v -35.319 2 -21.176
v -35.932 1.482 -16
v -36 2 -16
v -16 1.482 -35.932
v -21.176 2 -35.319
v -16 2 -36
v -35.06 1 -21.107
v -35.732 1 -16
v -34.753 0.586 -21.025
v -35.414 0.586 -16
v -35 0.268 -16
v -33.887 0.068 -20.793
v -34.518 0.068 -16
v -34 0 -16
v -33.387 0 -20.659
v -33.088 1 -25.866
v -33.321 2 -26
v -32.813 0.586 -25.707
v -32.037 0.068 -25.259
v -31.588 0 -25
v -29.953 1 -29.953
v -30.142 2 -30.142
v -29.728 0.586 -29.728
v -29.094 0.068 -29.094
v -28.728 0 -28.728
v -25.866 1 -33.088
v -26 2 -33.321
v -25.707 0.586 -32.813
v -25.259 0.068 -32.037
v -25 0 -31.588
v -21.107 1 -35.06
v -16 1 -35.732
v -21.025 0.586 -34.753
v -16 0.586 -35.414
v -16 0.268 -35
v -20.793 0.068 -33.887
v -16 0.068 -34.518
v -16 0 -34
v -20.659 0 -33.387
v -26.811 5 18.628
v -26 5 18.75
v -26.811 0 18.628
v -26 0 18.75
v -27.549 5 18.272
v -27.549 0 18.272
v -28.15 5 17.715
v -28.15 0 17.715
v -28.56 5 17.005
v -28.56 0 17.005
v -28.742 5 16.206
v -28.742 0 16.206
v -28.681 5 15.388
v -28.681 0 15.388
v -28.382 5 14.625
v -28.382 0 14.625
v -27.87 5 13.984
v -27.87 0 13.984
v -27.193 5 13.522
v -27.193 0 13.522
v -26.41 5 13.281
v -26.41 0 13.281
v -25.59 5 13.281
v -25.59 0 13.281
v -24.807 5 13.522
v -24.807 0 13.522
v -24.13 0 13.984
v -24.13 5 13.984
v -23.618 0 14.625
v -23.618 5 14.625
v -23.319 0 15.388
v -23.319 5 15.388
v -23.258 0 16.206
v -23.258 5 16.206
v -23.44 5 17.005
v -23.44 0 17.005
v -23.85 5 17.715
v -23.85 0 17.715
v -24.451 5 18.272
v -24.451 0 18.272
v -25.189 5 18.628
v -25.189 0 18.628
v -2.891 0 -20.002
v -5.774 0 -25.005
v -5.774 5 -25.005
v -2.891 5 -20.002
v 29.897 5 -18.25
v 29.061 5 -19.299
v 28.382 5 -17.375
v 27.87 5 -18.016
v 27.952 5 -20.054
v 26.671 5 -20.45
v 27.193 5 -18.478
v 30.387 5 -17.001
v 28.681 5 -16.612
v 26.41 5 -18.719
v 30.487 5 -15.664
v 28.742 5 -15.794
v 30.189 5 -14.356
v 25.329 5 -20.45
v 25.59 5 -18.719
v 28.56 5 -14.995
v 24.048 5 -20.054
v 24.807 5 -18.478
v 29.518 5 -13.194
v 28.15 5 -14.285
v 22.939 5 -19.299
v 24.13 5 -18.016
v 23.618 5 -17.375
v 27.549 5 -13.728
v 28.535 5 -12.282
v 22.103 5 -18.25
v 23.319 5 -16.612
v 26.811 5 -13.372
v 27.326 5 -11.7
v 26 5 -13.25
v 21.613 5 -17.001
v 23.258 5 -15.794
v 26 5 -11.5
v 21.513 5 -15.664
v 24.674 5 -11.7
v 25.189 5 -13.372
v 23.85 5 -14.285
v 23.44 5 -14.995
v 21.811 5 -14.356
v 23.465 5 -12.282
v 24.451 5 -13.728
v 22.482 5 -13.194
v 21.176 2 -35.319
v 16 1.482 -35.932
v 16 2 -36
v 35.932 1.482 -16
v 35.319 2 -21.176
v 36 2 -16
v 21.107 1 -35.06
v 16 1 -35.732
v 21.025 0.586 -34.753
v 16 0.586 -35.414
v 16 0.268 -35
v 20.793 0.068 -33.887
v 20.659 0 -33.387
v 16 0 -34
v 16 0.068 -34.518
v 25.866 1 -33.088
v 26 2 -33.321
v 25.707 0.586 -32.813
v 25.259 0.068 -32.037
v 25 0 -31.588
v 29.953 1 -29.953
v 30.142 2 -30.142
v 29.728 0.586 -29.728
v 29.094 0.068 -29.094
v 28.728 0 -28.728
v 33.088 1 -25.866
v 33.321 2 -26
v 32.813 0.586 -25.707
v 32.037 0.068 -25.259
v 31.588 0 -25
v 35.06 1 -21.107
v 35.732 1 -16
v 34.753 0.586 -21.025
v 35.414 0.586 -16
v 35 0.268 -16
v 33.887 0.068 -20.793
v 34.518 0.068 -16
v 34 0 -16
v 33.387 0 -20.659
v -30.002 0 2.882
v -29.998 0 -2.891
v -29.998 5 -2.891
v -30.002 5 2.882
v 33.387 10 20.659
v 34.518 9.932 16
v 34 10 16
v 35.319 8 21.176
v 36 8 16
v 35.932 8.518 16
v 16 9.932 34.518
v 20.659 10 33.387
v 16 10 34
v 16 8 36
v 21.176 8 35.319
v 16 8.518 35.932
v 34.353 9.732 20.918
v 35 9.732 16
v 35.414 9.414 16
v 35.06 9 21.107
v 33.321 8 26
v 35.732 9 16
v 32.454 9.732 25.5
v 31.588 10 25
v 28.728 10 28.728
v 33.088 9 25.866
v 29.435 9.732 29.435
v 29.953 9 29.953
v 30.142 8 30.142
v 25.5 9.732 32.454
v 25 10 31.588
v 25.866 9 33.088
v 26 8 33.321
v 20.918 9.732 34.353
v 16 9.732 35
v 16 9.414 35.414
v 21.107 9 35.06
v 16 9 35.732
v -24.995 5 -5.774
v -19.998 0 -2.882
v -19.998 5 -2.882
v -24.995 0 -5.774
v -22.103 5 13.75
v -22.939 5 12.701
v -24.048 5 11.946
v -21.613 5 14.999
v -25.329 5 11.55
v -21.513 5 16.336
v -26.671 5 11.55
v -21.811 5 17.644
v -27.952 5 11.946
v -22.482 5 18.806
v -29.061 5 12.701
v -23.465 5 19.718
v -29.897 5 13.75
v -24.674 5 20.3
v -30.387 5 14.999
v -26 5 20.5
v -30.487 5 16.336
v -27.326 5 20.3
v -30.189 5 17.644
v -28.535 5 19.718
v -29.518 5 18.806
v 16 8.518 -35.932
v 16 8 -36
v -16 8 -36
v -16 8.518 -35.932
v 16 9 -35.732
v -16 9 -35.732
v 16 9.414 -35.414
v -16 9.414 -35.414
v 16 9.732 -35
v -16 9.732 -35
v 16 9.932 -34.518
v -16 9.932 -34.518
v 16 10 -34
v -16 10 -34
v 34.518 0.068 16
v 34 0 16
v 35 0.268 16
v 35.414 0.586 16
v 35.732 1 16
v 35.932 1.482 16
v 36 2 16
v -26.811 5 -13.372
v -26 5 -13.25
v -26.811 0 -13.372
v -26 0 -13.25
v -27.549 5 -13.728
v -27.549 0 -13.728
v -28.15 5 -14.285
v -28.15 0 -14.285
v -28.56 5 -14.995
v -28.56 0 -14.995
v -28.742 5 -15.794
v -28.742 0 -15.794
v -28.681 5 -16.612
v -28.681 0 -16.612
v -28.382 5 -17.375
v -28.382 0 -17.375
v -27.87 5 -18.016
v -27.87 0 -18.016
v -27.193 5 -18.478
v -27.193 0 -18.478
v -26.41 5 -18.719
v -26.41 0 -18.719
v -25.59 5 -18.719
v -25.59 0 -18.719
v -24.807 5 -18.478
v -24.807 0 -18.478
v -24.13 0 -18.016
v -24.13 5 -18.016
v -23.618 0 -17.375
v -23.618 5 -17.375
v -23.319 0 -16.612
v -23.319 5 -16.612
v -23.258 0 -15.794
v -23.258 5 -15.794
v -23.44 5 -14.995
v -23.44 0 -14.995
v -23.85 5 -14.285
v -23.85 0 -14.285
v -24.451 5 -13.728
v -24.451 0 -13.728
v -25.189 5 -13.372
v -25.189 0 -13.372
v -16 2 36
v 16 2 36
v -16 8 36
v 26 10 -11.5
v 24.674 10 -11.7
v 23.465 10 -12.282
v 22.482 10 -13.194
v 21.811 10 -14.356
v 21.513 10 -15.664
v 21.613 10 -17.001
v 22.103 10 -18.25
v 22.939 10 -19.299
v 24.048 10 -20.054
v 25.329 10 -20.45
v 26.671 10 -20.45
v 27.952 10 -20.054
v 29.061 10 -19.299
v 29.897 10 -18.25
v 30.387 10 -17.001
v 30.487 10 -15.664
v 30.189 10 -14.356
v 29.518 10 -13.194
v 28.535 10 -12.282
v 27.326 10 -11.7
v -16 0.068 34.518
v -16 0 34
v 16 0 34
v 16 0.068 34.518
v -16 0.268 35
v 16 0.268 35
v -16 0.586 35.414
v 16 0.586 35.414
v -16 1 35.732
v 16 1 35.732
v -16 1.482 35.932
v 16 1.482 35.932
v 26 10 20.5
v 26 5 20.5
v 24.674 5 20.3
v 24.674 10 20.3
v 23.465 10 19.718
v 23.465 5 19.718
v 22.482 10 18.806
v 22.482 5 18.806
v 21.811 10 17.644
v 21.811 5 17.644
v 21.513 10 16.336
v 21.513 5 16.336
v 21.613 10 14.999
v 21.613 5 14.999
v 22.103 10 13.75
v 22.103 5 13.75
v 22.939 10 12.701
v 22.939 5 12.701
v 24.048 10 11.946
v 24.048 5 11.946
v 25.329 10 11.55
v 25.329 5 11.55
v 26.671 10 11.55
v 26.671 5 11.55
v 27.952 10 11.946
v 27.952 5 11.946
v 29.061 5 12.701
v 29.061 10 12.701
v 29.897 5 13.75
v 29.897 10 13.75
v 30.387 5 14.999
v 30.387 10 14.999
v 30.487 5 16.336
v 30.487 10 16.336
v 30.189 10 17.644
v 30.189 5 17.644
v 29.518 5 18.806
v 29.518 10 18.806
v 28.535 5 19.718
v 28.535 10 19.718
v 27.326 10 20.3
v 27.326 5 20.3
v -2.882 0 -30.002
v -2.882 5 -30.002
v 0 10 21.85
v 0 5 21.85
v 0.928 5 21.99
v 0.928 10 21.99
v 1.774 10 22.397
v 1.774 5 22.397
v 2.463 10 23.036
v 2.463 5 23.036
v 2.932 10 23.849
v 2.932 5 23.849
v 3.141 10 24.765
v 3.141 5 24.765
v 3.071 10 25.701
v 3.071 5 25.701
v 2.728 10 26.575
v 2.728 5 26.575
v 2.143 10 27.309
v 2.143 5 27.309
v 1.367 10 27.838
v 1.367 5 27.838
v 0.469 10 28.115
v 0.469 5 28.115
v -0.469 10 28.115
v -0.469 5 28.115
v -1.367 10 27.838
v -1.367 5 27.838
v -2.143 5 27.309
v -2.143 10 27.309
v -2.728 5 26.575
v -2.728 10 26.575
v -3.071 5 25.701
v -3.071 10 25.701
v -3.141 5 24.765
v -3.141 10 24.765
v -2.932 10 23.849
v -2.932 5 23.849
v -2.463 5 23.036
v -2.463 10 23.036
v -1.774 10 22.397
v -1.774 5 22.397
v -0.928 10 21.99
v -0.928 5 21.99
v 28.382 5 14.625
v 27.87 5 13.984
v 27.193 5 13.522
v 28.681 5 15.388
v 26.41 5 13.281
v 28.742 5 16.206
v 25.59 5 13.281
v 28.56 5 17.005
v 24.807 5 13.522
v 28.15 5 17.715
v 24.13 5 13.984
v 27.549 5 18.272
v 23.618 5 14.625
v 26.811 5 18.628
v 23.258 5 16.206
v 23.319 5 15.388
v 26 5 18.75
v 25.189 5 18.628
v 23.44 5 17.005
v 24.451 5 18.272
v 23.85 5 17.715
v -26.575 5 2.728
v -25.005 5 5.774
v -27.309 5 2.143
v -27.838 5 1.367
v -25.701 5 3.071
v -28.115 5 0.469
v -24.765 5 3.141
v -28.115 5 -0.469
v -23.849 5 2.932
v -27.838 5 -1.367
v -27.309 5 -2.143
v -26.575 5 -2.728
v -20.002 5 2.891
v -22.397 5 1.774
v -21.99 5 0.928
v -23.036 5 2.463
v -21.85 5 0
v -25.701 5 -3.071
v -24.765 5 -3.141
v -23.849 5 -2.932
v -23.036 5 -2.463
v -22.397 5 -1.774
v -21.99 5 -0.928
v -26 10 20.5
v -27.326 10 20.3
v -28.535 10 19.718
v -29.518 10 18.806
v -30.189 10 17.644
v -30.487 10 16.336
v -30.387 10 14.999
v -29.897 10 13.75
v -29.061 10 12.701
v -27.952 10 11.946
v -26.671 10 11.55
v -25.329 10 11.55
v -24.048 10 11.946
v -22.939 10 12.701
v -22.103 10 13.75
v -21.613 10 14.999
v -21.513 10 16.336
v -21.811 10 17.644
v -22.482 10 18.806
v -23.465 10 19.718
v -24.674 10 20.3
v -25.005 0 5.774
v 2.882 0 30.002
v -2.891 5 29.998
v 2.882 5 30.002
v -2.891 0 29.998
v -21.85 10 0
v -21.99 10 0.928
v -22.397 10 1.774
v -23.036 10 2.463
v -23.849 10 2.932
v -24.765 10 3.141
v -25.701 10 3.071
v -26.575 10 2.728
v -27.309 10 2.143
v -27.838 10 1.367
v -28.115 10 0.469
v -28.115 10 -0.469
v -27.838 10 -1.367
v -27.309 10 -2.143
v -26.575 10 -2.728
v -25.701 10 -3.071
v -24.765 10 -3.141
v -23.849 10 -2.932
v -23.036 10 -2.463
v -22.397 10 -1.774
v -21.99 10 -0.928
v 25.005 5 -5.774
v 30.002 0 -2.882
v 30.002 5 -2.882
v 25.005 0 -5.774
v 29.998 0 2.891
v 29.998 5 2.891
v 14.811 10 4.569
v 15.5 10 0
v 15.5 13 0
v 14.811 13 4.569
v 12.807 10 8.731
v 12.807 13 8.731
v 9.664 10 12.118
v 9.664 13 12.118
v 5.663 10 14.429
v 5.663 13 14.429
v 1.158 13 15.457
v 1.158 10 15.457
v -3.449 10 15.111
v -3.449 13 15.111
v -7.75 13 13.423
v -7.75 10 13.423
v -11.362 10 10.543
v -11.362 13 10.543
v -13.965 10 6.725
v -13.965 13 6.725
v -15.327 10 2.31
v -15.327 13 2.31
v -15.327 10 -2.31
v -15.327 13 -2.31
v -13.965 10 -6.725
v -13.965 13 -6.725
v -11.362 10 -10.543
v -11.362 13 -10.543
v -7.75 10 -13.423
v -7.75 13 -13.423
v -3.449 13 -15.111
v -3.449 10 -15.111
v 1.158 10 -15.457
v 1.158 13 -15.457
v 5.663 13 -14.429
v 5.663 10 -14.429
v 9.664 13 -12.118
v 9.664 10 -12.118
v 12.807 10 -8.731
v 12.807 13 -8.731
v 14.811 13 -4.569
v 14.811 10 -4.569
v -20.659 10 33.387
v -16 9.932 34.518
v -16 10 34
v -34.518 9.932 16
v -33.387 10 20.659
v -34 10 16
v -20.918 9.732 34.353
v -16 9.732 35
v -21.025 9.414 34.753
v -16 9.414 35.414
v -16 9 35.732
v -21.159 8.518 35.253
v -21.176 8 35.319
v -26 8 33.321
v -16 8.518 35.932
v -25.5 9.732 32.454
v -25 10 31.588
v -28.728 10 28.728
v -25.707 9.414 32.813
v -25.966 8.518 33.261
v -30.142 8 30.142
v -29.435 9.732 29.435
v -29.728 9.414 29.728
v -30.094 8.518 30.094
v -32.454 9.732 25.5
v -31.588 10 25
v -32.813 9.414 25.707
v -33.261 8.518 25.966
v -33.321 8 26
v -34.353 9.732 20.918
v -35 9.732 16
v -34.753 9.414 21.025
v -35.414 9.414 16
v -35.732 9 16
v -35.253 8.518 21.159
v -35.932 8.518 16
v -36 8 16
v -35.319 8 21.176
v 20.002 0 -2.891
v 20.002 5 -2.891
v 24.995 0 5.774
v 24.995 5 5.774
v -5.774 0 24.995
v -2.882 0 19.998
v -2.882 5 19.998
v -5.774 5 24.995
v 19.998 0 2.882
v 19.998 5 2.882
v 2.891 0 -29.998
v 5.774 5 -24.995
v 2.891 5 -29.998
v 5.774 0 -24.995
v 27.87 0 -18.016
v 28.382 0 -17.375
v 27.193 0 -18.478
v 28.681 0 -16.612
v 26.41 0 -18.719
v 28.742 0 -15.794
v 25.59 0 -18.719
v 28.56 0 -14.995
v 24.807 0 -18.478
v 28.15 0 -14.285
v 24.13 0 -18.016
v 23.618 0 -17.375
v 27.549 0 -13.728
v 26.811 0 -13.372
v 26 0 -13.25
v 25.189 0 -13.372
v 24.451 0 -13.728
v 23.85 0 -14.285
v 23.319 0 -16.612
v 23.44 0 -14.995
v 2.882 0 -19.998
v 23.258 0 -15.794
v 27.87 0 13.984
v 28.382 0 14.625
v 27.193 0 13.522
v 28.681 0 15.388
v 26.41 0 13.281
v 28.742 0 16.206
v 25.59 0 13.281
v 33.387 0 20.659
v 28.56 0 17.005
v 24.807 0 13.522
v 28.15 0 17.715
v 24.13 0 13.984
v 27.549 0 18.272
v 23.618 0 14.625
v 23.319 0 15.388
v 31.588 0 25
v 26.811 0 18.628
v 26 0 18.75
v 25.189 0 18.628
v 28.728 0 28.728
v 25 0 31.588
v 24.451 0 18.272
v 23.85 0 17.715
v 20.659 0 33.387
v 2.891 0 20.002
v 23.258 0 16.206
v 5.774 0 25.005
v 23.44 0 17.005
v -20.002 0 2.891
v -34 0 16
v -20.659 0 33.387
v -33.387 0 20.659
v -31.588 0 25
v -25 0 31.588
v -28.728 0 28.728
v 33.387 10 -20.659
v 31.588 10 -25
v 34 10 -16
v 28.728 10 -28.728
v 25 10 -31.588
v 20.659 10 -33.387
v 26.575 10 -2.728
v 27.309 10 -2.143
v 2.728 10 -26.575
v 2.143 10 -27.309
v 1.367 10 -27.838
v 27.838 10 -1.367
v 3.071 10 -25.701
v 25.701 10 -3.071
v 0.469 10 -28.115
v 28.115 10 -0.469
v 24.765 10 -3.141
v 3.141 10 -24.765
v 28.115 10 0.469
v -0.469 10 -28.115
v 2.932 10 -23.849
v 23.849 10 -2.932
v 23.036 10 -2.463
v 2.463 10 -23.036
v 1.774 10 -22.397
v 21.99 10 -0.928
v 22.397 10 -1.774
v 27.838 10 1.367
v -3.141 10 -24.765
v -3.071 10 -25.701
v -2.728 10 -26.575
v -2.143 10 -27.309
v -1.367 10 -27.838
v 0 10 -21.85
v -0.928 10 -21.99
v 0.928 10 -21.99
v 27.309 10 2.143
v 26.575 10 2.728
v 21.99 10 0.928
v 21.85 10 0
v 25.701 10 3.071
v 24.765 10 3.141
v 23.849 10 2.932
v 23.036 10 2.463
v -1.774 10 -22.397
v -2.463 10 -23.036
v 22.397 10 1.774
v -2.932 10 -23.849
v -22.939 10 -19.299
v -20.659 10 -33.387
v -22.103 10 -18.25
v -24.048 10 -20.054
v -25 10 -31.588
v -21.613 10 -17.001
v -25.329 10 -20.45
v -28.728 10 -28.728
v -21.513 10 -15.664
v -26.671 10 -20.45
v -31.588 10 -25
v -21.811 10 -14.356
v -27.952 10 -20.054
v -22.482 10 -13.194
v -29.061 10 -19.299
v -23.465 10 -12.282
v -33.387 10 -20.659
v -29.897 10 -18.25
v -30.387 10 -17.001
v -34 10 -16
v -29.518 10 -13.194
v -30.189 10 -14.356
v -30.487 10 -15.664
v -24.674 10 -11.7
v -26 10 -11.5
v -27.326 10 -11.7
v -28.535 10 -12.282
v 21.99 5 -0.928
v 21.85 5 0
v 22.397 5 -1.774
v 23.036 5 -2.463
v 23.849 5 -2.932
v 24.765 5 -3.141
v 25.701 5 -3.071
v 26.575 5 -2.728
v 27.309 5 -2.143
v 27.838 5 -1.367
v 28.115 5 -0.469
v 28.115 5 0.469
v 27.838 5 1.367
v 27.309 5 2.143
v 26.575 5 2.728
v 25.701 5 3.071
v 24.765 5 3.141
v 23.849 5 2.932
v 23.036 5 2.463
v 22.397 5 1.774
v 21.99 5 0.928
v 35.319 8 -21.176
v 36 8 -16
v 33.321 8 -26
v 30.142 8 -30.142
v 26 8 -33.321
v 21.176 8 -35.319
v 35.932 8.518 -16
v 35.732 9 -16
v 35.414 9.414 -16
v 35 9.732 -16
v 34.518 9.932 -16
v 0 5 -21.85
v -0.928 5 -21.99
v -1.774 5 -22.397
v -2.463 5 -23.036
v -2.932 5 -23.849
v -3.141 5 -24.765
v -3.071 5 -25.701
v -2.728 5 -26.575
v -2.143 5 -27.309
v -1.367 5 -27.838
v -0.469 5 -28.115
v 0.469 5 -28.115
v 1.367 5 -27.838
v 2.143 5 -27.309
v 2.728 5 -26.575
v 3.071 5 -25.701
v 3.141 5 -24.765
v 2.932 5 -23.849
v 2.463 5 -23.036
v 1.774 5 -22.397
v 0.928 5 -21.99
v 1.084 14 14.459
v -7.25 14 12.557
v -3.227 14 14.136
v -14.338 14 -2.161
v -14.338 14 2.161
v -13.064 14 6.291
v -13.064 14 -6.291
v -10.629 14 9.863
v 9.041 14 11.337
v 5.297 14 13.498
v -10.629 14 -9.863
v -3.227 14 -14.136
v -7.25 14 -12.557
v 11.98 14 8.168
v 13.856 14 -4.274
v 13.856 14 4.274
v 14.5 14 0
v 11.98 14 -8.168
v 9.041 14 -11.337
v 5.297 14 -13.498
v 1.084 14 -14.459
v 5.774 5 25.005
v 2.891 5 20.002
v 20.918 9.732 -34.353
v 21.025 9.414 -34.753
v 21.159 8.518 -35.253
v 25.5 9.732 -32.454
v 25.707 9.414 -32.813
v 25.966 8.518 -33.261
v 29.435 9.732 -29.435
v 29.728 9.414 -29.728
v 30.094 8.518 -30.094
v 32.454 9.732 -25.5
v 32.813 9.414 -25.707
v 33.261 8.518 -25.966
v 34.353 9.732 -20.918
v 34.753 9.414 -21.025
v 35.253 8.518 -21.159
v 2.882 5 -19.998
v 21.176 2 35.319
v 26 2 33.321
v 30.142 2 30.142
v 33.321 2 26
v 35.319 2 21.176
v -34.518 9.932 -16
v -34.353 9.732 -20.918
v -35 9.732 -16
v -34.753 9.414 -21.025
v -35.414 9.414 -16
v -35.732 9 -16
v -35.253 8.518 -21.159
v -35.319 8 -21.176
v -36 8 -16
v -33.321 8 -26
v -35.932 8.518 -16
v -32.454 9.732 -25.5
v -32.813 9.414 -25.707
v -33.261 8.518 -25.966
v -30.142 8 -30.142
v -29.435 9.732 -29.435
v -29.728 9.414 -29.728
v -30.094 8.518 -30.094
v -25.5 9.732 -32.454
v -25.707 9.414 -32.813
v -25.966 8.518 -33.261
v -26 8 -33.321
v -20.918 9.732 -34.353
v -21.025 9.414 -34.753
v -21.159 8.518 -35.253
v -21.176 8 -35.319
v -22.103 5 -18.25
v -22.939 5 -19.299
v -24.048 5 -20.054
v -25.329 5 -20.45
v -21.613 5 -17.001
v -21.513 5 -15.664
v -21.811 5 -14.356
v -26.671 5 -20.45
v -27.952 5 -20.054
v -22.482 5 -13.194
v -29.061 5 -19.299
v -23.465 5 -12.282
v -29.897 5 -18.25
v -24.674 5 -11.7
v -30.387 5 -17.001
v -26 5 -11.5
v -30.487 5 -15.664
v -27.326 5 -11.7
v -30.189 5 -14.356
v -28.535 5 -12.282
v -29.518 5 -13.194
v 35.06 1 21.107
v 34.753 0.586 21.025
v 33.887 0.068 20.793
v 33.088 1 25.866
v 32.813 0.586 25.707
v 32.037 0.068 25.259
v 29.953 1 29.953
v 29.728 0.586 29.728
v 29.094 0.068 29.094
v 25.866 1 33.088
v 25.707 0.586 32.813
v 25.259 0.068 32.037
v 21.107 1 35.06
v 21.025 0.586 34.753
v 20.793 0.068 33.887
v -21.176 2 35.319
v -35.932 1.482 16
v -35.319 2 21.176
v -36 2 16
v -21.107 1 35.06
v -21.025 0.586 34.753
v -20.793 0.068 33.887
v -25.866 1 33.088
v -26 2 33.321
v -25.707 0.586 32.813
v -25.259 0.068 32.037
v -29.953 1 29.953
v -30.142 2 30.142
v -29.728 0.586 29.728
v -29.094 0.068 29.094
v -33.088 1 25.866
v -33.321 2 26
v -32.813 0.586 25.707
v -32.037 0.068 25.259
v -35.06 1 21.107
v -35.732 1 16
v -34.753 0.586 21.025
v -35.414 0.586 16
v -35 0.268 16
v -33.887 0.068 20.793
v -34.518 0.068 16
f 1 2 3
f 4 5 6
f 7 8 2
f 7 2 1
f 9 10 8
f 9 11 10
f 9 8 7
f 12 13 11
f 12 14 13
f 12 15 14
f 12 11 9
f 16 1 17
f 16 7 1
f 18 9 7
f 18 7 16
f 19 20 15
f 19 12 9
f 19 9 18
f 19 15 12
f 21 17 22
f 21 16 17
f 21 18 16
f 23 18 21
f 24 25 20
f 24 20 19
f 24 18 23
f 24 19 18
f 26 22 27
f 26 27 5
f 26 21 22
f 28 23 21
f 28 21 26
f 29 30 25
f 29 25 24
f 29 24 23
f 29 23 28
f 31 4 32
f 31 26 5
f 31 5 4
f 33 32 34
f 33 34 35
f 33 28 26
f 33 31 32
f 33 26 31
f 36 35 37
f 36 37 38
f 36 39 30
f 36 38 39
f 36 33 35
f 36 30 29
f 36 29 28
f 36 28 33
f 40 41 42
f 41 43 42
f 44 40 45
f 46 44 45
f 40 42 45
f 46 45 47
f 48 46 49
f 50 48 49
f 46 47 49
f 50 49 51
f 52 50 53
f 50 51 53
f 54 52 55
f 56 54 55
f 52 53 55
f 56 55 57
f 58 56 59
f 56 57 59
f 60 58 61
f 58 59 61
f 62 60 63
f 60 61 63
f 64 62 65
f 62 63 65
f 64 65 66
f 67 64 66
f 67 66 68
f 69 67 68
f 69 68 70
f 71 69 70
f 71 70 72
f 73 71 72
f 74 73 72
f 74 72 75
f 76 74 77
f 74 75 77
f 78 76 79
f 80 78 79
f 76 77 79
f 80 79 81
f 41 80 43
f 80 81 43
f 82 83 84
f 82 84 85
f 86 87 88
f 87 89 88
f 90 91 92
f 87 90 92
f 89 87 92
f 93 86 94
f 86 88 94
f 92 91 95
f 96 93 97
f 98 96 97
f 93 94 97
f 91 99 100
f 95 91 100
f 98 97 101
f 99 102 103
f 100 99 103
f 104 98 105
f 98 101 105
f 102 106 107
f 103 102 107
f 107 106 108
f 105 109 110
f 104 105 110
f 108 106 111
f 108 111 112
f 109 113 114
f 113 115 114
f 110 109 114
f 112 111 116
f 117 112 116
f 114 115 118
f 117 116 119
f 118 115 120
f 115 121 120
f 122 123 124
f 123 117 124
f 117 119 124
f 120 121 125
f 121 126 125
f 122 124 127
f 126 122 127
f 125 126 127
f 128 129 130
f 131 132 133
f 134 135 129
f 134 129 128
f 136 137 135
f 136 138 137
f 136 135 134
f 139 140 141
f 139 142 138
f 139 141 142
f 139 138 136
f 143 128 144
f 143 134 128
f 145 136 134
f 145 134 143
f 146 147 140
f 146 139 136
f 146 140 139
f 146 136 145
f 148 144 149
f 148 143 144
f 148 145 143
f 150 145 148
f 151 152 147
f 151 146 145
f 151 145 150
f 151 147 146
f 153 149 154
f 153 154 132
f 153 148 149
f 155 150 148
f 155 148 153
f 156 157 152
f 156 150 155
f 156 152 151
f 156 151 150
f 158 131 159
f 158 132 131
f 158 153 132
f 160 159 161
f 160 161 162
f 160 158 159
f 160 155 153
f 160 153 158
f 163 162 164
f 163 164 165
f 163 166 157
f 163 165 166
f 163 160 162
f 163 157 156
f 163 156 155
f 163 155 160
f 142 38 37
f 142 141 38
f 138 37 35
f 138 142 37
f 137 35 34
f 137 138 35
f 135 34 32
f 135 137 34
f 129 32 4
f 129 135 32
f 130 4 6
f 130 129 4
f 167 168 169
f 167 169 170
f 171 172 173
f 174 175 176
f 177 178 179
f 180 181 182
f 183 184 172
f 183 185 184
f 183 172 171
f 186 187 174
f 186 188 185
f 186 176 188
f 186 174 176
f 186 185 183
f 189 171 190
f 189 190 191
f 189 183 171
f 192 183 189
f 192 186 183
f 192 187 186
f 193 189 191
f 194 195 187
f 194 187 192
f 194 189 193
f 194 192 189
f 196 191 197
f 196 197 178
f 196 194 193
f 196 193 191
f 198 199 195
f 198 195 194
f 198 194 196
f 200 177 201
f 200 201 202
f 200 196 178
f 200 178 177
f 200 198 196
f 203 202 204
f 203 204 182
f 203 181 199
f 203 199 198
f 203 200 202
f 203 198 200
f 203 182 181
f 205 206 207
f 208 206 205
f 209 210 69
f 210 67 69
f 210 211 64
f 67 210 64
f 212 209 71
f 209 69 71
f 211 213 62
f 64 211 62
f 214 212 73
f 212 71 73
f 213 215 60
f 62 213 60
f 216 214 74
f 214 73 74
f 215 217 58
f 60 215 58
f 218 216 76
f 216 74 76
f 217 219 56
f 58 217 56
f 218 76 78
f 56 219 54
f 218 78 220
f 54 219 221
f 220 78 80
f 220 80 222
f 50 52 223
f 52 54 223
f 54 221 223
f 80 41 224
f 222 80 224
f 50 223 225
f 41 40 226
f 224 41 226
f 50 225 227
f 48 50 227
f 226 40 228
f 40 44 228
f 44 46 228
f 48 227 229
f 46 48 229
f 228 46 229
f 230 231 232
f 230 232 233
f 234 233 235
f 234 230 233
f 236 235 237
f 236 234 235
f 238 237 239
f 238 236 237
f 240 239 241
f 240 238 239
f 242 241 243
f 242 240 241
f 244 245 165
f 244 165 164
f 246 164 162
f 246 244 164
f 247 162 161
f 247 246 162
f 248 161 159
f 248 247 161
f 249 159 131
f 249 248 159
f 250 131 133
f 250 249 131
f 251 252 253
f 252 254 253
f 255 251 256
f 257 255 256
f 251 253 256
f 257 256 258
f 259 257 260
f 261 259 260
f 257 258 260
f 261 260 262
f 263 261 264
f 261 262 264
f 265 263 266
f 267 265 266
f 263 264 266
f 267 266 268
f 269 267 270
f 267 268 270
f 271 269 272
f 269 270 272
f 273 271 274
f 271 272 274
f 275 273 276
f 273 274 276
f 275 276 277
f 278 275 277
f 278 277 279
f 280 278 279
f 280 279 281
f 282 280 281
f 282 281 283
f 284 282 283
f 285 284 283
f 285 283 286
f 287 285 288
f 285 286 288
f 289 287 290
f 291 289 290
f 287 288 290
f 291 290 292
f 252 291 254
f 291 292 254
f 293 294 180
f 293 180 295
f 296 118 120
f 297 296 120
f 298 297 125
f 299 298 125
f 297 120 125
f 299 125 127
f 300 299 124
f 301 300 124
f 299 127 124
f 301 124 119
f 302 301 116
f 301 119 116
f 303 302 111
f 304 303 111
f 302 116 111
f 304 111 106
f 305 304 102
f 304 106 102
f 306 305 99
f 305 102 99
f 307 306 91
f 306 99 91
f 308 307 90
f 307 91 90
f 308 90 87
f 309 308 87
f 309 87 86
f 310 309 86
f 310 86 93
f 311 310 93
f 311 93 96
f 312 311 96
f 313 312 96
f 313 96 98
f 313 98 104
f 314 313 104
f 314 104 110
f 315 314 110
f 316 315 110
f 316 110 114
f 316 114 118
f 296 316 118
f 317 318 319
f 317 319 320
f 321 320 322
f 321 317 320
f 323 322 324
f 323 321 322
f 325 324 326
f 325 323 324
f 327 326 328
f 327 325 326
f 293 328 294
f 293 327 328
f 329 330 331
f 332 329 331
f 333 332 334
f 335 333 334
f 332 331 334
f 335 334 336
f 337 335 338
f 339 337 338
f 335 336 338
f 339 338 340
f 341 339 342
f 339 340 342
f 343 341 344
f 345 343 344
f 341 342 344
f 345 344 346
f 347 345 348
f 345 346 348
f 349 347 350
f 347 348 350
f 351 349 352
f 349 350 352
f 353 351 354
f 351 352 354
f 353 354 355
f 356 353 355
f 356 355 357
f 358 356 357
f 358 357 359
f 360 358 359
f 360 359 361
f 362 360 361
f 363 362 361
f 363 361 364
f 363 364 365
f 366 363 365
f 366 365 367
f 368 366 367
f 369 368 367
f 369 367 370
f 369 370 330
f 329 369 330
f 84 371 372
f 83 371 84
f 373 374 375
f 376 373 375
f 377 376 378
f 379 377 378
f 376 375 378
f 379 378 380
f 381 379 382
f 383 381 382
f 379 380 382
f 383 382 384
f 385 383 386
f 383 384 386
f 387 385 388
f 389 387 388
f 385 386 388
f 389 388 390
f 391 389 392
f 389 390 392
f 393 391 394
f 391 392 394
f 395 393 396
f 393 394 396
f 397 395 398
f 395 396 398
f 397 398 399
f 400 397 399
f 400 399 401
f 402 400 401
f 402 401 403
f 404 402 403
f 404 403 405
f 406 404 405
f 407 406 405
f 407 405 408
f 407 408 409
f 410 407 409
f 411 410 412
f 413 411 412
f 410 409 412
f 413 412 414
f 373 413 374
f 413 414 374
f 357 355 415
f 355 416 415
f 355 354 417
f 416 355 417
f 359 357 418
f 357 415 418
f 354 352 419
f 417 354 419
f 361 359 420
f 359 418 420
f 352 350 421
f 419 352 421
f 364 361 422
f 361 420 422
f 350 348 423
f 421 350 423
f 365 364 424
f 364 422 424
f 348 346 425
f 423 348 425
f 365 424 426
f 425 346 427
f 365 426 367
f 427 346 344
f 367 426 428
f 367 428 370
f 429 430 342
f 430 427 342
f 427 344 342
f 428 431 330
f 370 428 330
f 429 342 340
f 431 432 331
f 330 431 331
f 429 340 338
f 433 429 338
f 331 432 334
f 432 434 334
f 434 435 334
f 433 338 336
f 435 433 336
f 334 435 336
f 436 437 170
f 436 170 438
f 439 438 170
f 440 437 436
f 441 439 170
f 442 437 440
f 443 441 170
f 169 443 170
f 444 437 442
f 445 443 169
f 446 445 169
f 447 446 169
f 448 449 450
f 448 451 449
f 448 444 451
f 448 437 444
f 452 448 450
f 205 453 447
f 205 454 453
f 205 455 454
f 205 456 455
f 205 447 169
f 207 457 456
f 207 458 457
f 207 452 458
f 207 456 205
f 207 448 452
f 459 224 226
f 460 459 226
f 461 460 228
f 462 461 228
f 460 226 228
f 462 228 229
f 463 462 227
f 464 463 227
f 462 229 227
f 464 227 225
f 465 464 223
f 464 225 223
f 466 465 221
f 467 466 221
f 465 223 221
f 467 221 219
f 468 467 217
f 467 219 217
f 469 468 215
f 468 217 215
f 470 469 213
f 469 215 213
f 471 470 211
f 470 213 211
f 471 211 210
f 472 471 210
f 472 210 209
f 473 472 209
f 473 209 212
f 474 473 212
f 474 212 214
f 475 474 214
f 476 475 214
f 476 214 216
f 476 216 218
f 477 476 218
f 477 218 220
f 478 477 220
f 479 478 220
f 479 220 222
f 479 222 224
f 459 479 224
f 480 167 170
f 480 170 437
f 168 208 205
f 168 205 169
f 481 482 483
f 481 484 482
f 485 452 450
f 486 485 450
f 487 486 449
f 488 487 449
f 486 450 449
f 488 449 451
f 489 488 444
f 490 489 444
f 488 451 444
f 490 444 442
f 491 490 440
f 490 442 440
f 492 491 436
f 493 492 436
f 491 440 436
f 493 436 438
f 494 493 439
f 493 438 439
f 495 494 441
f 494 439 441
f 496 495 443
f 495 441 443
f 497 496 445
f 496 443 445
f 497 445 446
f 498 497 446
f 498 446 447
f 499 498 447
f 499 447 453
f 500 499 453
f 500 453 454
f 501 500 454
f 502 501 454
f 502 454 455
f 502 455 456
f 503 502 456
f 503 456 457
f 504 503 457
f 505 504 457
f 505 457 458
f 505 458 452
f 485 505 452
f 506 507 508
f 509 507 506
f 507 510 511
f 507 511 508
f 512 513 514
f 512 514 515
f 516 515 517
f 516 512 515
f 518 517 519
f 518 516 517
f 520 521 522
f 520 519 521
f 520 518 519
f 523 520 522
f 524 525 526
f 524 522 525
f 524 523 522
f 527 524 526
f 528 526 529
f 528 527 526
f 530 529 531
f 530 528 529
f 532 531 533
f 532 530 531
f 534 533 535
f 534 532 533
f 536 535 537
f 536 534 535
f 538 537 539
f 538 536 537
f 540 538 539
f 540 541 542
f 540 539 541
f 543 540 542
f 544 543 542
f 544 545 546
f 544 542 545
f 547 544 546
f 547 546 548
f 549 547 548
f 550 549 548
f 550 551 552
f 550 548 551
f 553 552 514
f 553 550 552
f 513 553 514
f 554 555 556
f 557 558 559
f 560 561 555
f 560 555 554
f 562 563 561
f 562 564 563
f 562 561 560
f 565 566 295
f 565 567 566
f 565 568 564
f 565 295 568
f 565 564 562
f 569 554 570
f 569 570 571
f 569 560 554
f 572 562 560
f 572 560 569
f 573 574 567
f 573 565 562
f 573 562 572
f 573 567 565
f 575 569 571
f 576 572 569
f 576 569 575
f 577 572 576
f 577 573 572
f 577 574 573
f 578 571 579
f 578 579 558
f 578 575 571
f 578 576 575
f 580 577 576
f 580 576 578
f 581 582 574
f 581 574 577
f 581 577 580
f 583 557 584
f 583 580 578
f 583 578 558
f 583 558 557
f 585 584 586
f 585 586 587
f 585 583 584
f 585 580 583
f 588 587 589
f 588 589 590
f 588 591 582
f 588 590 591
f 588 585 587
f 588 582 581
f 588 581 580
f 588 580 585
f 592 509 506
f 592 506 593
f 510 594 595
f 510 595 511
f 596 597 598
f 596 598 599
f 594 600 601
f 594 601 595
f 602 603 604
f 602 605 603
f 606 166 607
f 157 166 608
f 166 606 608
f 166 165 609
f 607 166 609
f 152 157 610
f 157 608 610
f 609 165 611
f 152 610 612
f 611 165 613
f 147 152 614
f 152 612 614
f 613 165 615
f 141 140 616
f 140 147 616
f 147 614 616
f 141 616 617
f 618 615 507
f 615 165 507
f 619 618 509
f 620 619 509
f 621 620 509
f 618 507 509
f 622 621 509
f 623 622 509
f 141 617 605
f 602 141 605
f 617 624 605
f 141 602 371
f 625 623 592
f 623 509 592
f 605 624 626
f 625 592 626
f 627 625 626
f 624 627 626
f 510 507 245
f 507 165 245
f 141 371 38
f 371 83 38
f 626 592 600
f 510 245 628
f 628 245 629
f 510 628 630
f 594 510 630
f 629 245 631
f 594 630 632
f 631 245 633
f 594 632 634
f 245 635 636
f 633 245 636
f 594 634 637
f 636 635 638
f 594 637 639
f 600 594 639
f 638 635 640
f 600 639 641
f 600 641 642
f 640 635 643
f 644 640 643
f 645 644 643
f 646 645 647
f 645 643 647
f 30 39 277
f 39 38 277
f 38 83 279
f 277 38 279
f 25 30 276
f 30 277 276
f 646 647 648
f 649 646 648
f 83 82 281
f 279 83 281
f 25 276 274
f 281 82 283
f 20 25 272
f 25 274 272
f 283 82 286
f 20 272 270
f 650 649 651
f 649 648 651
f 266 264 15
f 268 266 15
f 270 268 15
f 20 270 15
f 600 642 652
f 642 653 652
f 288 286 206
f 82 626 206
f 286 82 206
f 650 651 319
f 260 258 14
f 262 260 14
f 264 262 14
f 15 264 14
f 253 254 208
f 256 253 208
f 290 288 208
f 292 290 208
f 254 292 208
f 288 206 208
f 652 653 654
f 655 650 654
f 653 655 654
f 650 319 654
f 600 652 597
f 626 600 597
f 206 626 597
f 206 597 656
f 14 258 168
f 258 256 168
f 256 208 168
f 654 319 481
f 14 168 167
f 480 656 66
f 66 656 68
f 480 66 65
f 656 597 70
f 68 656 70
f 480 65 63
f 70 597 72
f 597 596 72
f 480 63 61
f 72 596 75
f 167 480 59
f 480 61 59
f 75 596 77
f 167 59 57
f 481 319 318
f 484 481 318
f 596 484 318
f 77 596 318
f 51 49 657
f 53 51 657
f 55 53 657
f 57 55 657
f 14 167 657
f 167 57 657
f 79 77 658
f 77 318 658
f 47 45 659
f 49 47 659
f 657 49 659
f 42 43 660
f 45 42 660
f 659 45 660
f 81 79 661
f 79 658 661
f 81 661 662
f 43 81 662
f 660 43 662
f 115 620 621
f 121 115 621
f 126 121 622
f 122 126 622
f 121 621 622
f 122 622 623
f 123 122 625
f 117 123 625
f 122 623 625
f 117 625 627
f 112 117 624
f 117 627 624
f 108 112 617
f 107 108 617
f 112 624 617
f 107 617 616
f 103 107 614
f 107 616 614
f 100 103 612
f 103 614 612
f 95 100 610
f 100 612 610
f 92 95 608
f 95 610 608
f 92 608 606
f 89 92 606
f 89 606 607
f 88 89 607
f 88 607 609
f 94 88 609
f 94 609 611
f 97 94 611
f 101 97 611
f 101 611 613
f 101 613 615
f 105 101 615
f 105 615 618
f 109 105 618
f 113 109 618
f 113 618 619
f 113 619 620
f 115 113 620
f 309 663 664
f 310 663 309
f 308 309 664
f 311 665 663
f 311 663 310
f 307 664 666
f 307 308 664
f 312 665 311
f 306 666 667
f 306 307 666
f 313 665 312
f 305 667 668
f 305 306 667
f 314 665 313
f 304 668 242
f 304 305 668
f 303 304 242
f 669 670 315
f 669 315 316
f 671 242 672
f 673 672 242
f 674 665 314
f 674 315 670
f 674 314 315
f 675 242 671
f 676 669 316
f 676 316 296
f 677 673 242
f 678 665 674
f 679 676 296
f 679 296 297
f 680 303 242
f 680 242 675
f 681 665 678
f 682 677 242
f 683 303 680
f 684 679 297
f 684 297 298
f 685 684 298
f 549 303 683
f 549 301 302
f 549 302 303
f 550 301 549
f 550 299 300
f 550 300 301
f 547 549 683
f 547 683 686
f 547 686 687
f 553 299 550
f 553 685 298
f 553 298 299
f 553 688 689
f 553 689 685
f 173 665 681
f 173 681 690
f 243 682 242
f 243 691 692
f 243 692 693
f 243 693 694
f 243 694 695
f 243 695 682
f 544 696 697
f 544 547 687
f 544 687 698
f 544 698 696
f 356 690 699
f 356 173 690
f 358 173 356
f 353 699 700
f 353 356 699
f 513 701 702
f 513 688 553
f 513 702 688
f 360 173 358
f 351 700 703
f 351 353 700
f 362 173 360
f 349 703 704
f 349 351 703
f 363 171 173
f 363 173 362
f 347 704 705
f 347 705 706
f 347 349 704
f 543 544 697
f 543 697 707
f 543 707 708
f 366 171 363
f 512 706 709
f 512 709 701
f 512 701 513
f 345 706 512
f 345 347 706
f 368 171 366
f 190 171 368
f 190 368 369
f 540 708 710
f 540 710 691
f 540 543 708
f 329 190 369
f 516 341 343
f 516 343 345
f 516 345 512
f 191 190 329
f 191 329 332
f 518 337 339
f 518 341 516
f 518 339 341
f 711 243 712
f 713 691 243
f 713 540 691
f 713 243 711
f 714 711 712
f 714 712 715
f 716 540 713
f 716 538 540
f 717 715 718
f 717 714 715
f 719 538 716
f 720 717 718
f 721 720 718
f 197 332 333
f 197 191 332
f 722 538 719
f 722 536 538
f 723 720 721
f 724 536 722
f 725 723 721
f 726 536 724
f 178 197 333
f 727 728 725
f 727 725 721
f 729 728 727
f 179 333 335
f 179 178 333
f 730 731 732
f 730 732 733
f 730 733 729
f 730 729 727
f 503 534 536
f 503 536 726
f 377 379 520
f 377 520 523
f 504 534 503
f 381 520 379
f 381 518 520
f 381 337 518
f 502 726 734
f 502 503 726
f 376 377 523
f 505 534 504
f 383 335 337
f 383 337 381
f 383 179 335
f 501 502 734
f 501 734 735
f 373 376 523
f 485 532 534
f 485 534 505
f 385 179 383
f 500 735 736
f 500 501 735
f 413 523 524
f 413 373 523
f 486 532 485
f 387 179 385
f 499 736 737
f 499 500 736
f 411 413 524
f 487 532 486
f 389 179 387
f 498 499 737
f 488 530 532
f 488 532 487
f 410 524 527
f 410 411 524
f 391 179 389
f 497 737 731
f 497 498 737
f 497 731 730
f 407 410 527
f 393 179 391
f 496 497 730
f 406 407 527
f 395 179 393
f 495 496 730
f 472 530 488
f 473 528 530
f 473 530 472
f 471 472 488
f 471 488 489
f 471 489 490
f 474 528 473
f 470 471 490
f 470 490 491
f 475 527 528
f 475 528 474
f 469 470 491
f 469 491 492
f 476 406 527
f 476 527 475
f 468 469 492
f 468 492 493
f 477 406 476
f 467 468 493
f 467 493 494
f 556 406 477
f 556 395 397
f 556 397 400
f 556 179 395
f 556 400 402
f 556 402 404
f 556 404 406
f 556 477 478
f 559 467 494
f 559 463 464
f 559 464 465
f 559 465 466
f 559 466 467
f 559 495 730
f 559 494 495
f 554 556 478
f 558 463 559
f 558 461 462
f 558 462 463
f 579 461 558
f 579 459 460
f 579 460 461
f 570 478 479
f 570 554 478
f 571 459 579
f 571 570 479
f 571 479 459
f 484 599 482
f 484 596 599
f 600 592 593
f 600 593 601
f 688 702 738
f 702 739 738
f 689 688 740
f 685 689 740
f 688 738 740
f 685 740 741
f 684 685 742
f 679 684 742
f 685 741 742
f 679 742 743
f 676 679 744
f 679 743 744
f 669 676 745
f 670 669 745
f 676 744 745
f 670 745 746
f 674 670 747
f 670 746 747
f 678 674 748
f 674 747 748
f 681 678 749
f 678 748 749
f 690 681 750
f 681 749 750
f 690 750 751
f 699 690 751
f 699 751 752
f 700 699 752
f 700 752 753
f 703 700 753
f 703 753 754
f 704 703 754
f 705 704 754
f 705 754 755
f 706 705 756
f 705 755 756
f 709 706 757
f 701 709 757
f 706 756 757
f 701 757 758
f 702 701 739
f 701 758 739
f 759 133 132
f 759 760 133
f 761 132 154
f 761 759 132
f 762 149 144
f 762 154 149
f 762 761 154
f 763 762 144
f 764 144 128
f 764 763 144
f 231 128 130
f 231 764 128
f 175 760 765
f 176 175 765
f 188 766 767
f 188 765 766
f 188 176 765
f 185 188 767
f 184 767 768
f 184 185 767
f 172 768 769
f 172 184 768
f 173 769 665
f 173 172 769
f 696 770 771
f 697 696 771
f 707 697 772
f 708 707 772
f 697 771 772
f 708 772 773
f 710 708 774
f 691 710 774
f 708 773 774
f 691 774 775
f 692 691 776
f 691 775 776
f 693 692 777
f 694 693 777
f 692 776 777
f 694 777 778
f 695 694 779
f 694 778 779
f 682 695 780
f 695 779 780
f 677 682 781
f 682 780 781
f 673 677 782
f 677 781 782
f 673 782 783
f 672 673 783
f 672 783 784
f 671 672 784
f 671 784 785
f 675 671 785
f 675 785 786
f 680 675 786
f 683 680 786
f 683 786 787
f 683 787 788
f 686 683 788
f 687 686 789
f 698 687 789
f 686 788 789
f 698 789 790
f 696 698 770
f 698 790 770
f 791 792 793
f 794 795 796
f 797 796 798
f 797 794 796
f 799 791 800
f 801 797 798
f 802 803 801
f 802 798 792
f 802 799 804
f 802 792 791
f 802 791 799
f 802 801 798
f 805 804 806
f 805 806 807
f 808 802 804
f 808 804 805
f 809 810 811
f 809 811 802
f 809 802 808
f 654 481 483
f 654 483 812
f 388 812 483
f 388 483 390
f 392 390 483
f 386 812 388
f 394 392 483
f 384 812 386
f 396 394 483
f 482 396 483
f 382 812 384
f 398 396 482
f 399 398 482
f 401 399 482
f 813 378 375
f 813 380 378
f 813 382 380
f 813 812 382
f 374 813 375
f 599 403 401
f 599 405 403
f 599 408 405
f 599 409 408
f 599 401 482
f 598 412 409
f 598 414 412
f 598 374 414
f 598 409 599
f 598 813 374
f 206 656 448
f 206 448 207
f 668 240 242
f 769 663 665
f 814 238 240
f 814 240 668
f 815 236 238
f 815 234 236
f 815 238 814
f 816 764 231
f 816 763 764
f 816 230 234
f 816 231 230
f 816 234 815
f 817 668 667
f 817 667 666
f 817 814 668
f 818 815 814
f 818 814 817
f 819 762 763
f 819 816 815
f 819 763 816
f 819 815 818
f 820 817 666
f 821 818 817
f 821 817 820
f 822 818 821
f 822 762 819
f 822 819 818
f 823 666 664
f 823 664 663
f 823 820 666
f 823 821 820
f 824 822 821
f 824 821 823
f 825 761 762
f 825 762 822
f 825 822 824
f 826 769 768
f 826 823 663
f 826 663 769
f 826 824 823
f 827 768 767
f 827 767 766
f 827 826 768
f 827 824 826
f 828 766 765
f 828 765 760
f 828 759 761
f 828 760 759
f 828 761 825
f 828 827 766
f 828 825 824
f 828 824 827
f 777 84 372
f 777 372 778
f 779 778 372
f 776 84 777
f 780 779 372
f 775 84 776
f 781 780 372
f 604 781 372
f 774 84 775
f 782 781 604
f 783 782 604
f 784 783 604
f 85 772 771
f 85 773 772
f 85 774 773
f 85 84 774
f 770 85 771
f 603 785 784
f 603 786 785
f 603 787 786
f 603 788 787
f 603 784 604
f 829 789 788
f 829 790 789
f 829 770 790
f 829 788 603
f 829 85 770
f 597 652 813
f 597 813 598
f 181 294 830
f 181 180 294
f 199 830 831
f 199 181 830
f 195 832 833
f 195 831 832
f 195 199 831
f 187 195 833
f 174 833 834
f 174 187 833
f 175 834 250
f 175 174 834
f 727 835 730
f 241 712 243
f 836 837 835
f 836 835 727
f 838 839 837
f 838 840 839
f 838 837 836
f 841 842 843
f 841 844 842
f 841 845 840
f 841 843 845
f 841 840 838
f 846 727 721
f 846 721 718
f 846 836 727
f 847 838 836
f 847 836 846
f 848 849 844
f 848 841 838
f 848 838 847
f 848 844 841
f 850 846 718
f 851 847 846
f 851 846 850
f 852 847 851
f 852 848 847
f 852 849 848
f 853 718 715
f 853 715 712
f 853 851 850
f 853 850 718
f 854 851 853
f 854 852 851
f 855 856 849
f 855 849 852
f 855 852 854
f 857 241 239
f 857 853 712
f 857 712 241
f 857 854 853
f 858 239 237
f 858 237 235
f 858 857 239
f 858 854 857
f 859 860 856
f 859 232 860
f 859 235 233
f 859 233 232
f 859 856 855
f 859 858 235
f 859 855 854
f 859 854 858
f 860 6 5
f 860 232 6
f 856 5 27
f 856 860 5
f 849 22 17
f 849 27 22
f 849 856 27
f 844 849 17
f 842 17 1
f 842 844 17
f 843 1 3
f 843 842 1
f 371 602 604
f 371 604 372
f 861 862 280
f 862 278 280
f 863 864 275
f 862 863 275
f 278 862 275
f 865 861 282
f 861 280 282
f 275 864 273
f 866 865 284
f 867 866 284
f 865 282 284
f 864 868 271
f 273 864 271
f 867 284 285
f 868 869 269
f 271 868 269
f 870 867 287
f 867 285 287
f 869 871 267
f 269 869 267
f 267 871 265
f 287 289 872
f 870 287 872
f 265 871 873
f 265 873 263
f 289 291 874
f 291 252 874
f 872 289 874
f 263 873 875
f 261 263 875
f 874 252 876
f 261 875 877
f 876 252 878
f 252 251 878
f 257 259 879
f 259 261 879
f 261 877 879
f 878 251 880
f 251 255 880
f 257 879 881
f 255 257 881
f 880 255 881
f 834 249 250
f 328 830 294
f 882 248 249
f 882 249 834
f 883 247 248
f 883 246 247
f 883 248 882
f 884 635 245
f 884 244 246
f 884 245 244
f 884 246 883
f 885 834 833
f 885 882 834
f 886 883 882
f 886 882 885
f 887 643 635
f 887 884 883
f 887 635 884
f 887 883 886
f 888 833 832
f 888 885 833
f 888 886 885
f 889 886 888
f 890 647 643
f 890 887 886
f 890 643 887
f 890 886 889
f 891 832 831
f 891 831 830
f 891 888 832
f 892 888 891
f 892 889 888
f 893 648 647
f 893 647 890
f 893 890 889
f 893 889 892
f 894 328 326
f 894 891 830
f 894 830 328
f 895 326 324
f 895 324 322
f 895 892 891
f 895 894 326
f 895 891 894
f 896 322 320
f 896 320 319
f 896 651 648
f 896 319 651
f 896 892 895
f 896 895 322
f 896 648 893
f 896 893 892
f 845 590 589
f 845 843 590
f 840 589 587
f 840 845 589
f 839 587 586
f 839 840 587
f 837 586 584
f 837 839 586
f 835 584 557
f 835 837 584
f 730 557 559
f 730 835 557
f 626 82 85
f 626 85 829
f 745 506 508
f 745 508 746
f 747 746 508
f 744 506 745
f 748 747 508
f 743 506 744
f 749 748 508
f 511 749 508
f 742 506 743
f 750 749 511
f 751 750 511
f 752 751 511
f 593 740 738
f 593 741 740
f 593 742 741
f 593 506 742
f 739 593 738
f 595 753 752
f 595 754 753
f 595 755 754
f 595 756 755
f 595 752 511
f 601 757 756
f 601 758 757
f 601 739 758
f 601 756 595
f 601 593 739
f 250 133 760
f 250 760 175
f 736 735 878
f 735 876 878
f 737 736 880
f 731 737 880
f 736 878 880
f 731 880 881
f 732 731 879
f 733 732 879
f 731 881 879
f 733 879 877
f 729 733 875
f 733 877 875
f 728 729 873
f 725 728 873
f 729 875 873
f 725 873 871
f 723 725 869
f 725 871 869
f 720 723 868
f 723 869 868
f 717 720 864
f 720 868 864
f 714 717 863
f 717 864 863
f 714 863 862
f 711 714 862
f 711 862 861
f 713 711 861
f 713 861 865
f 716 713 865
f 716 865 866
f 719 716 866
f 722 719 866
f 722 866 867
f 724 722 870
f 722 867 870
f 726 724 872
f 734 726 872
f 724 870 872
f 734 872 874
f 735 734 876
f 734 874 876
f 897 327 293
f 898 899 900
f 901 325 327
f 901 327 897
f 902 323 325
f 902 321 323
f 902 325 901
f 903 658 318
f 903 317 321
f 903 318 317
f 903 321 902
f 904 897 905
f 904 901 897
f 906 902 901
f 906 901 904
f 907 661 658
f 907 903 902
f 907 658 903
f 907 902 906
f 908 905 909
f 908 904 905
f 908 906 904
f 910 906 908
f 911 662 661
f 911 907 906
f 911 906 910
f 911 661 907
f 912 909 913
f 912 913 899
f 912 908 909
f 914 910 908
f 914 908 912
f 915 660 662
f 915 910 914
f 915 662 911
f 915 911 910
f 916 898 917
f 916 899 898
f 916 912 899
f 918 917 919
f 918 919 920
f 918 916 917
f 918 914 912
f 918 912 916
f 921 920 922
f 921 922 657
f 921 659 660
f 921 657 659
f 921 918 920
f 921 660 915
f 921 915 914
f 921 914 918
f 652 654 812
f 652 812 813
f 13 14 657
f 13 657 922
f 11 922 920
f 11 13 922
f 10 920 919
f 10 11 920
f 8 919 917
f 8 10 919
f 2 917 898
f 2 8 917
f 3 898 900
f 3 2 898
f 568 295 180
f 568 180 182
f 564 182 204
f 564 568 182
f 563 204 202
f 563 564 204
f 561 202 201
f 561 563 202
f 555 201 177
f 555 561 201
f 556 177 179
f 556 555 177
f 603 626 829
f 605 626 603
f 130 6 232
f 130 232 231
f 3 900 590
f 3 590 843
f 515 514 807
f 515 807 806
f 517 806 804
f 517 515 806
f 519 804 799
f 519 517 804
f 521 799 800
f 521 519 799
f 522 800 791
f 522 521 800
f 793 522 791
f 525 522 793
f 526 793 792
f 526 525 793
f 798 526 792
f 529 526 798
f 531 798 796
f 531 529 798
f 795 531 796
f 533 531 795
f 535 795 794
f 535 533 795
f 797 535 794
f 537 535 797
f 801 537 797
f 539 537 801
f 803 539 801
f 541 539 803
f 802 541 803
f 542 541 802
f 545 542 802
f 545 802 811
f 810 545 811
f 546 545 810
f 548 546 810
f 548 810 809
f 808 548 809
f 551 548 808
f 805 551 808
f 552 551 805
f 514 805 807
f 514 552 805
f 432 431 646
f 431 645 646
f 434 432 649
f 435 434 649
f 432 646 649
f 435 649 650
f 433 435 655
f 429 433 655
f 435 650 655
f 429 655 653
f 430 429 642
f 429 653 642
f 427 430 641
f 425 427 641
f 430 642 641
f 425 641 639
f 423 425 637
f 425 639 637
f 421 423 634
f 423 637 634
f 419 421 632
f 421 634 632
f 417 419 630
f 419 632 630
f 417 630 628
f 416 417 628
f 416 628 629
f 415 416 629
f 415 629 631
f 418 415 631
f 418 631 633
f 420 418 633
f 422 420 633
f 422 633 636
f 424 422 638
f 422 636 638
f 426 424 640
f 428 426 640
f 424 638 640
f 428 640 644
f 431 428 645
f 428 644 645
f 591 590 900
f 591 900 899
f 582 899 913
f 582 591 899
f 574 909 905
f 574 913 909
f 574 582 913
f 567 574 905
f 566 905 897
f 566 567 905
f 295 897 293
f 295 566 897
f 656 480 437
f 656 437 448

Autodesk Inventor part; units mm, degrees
ref_plane "YZ Plane" through (0, 0, 0) normal (1, 0, 0) x (0, 1, 0)
ref_plane "XZ Plane" through (0, 0, 0) normal (0, 1, 0) x (-1, 0, 0)
ref_plane "XY Plane" through (0, 0, 0) normal (0, 0, 1) x (1, 0, 0)
sketch "Sketch1" plane through (0, 0, 0) normal (0, 1, 0) x (-1, 0, 0)
  line L0 (36, -36) -> (-36, -36)
  line L1 (-36, -36) -> (-36, 36)
  line L2 (-36, 36) -> (36, 36)
  line L3 (36, 36) -> (36, -36)
  point P0 (36, 0)
  point P1 (0, 0)
  point P2 (0, -36)
  dimension "d4" = 72
  dimension "d5" = 72
extrude "Extrusion1" add sketch "Sketch1" along normal blind 10
sketch "Sketch2" plane through (0, 10, 0) normal (0, 1, 0) x (1, 0, 0)
  point P0 (0, 0)
  point P1 (-26, -16)
  dimension "d13" = 16
  dimension "d14" = 26
hole "Hole1" at (-26, 10, 16) direction (0, -1, 0) diameter 5.5 end through all counterbore diameter 9 counterbore depth 5 clearance for "Hex Head Bolt" size "M5" standard "Ansi Metric M Profile"
pattern_linear "Rectangular Pattern1" count 2 spacing 52 along (1, 0, 0) count 2 spacing 32 along (0, 0, -1) of "Hole1"
sketch "Sketch3" plane through (0, 10, 0) normal (0, 1, 0) x (1, 0, 0)
  point P0 (0, 0)
  point P1 (0, 25)
  dimension "d28" = 25
hole "Hole2" at (0, 10, -25) direction (0, -1, 0) diameter 6.3 end through all clearance for "Hex Head Bolt" size "M6" standard "Ansi Metric M Profile"
sketch "Sketch5" plane through (0, 0, 0) normal (0, -1, 0) x (1, 0, 0)
  circle A0 centre (0, -25) radius 3.15 projected
  line L0 (-2.8911, -20.0025) -> (2.8824, -19.9975)
  line L1 (2.8824, -19.9975) -> (5.7735, -24.995)
  line L2 (5.7735, -24.995) -> (2.8911, -29.9975)
  line L3 (2.8911, -29.9975) -> (-2.8824, -30.0025)
  line L4 (-2.8824, -30.0025) -> (-5.7735, -25.005)
  line L5 (-5.7735, -25.005) -> (-2.8911, -20.0025)
  point P0 (0, 0)
  dimension "d38" = 10
extrude "Extrusion3" cut sketch "Sketch5" against normal blind 5 contours A0 | L0 L1 L2 L3 L4 L5
pattern_circular "Circular Pattern3" count 4 over 360 about axis through (0, -10, 0) along (0, 1, 0) of "Hole2", "Extrusion3"
sketch "Sketch6" plane through (0, 10, 0) normal (0, 1, 0) x (1, 0, 0)
  circle A0 centre (0, 0) radius 15.5
  dimension "d44" = 31
extrude "Extrusion4" add sketch "Sketch6" along normal blind 4
chamfer "Chamfer1" distance 1 angle 45 1 edges at (-15.5, 14, 0)
fillet "Fillet1" radius 20 4 edges at (-36, 5, 36) (36, 5, 36) (36, 5, -36) (-36, 5, -36)
fillet "Fillet2" radius 2 16 edges at (30.1421, 10, 30.1421) (36, 10, 0) (30.1421, 10, -30.1421) (0, 10, -36) (-30.1421, 10, -30.1421) (-36, 10, 0) (-30.1421, 10, 30.1421) (0, 10, 36) (30.1421, 0, 30.1421) (36, 0, 0) (30.1421, 0, -30.1421) (0, 0, -36) (-30.1421, 0, -30.1421) (-36, 0, 0) (-30.1421, 0, 30.1421) (0, 0, 36)
properties part number "schunk_egi_quick_release_adapter_plate"
